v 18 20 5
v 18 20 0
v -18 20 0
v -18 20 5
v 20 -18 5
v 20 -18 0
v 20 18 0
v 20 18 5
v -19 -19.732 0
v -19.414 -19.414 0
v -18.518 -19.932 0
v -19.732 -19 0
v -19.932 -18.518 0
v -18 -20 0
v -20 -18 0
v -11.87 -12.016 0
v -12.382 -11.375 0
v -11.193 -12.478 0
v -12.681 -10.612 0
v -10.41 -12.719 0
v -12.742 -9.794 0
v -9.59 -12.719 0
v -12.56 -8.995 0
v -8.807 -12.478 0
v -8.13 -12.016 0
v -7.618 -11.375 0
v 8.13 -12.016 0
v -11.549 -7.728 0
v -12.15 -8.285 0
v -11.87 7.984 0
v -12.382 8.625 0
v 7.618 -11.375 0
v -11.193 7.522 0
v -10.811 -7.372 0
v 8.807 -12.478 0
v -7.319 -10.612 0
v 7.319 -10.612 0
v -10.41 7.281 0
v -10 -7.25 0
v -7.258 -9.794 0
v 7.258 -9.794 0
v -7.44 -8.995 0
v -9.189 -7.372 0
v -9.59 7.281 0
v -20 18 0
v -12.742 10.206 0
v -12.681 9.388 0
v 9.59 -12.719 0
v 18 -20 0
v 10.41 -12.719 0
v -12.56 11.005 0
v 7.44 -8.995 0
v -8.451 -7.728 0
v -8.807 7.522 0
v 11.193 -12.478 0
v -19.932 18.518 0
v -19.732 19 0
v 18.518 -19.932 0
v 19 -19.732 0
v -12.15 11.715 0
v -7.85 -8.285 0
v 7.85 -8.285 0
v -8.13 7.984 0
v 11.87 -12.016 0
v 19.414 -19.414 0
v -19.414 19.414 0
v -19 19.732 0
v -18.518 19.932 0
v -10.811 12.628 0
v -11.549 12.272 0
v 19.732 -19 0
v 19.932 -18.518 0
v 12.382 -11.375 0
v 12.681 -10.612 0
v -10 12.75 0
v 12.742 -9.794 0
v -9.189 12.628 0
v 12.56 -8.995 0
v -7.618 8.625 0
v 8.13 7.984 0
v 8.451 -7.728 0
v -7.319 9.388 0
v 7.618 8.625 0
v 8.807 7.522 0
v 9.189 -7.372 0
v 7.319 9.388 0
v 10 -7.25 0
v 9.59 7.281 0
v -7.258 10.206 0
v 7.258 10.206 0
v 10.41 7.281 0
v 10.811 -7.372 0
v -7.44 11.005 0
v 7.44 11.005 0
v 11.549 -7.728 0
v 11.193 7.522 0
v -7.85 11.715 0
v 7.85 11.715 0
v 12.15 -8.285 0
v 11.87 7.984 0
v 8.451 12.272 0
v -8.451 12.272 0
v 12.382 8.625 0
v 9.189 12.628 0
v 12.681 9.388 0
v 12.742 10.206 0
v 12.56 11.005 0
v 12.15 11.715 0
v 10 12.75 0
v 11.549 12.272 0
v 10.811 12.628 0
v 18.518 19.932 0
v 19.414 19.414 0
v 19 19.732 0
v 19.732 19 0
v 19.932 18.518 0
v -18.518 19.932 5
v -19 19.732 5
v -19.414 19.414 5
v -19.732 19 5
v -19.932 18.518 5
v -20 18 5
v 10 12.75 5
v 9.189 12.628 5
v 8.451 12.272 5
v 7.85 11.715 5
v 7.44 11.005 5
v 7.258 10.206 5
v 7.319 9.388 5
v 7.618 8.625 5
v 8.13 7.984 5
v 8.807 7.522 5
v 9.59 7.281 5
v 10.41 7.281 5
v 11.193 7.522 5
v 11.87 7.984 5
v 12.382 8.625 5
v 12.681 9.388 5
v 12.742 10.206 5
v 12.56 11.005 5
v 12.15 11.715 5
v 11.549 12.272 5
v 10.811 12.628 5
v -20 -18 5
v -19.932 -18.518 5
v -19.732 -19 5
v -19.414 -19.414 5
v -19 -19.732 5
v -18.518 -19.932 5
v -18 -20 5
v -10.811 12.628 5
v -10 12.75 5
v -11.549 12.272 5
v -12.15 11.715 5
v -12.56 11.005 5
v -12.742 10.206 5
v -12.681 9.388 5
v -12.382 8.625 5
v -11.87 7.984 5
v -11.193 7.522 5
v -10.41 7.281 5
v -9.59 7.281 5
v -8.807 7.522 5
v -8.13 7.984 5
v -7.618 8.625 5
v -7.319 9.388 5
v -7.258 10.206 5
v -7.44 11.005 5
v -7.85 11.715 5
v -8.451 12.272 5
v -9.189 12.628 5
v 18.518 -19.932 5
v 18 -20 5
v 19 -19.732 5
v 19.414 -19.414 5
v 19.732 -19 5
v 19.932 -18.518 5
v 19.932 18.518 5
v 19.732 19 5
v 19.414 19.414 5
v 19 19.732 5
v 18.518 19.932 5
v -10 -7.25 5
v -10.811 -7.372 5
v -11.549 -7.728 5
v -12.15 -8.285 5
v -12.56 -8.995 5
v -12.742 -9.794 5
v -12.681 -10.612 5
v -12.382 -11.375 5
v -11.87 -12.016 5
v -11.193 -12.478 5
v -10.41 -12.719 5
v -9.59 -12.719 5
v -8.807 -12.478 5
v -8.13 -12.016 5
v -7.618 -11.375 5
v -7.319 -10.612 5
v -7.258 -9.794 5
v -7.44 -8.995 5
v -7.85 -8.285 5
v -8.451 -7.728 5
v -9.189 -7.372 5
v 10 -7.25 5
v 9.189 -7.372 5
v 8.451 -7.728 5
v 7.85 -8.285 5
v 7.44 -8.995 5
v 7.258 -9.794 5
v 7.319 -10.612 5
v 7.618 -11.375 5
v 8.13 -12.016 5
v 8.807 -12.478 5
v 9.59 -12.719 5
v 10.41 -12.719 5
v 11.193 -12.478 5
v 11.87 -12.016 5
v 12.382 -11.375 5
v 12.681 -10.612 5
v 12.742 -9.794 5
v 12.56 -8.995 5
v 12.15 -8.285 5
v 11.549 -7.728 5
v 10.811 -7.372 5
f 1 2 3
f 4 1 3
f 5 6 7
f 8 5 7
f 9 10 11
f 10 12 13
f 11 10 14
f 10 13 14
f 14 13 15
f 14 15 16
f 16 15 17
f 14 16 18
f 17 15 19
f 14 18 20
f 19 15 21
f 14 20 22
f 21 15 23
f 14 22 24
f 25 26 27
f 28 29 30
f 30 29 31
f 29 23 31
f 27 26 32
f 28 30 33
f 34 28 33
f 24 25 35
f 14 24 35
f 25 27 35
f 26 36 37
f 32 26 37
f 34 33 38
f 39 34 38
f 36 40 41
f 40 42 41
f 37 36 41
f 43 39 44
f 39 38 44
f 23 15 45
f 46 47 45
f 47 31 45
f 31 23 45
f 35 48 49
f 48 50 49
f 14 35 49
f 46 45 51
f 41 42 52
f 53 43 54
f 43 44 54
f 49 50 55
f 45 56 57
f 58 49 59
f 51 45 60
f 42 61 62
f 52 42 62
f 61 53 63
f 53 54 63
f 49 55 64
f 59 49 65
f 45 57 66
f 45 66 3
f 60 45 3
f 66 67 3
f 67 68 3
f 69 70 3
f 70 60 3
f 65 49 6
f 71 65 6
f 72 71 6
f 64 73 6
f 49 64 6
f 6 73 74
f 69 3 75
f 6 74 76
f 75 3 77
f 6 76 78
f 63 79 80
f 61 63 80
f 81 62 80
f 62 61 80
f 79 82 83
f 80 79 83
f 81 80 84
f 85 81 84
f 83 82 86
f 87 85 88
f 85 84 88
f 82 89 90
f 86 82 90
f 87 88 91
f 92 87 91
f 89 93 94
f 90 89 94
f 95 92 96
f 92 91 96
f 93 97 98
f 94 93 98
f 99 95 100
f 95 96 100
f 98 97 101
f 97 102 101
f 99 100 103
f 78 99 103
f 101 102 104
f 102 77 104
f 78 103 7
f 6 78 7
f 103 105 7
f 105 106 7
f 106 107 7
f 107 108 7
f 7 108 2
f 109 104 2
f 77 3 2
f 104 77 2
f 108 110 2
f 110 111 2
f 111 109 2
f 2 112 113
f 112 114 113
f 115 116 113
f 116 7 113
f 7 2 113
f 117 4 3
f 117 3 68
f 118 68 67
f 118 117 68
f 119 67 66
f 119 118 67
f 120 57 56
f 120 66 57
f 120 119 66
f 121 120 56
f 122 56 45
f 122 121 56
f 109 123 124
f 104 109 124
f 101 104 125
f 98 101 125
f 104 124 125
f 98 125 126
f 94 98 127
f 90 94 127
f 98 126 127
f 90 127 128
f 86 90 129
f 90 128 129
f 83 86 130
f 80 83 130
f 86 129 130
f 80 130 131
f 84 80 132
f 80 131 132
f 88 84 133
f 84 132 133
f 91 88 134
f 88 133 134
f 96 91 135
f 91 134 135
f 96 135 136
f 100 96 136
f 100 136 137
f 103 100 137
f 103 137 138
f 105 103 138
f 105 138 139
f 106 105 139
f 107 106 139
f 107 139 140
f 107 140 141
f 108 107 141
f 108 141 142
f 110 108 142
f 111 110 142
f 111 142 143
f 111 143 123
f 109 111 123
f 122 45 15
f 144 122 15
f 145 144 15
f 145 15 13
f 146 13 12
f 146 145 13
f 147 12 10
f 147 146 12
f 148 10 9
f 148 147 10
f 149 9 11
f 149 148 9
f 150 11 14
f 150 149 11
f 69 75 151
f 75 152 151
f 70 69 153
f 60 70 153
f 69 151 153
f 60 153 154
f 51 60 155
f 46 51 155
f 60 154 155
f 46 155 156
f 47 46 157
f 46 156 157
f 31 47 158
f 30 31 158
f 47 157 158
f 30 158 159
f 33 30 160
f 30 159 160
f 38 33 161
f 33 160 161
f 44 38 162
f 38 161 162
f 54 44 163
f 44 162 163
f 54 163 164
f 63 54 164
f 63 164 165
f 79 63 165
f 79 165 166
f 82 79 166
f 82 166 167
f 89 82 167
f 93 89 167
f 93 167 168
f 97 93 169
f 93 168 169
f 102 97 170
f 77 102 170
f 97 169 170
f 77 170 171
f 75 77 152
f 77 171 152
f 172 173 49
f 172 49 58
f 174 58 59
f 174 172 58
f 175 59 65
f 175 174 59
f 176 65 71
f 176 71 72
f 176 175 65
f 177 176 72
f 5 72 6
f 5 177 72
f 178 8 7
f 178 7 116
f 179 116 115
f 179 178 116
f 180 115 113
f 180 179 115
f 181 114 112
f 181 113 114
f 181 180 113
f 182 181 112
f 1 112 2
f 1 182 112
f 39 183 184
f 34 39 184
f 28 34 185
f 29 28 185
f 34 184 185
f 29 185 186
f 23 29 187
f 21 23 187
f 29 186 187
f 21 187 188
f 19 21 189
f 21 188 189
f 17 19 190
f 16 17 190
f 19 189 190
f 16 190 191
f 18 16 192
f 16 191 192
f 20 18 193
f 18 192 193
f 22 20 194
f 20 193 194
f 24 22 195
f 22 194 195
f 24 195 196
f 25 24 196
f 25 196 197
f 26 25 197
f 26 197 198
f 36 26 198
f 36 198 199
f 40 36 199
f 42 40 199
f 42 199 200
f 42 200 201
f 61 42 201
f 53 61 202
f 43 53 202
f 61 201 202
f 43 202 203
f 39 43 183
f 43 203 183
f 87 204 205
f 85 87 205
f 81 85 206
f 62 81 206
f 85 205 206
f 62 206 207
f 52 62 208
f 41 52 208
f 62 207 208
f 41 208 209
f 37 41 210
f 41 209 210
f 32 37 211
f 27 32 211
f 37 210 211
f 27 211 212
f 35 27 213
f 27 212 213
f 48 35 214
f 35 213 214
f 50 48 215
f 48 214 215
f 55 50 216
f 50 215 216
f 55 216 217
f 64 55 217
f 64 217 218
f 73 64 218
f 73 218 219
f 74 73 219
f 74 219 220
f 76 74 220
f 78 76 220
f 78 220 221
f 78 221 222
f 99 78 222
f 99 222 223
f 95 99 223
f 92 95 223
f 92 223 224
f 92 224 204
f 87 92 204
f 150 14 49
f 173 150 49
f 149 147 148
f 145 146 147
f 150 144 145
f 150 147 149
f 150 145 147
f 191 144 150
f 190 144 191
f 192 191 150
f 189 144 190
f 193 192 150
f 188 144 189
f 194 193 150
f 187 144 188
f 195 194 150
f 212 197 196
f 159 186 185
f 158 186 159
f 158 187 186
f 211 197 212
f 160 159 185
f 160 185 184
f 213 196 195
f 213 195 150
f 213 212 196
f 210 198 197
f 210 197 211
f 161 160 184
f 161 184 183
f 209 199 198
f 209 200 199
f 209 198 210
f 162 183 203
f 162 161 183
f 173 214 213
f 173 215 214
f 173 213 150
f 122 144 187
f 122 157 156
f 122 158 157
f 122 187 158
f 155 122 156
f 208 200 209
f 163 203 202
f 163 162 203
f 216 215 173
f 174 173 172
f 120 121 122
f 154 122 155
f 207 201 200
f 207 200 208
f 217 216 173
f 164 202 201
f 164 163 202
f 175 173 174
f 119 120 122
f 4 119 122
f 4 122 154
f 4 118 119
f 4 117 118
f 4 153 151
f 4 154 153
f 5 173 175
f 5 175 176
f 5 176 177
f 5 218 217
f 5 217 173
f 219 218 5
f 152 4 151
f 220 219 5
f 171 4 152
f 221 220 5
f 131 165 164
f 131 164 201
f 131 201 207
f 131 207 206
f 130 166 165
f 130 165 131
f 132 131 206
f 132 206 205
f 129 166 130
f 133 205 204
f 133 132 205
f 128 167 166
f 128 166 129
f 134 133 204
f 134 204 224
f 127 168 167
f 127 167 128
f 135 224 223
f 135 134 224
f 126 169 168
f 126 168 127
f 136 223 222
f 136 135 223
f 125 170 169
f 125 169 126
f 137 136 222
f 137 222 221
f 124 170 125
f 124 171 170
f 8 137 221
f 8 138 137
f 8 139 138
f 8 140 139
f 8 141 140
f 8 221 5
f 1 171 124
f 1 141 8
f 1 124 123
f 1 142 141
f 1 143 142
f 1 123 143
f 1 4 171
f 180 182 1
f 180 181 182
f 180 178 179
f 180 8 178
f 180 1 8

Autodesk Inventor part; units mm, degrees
ref_plane "YZ Plane" through (0, 0, 0) normal (1, 0, 0) x (0, 1, 0)
ref_plane "XZ Plane" through (0, 0, 0) normal (0, 1, 0) x (-1, 0, 0)
ref_plane "XY Plane" through (0, 0, 0) normal (0, 0, 1) x (1, 0, 0)
sketch "Sketch2" plane through (0, 0, 0) normal (0, 0, 1) x (1, 0, 0)
  line L0 (-20, -20) -> (20, -20)
  line L1 (20, -20) -> (20, 20)
  line L2 (20, 20) -> (-20, 20)
  line L3 (-20, 20) -> (-20, -20)
  line L4 (-20, -20) -> (20, 20) construction
  line L5 (20, -20) -> (-20, 20) construction
  line L6 (-10, -10) -> (10, -10) construction
  line L7 (10, -10) -> (10, 10) construction
  line L8 (10, 10) -> (-10, 10) construction
  line L9 (-10, 10) -> (-10, -10) construction
  line L10 (-10, -10) -> (10, 10) construction
  line L11 (10, -10) -> (-10, 10) construction
  point P0 (0, 0)
  dimension "d0" = 40
  dimension "d1" = 40
  dimension "d2" = 20
  dimension "d3" = 20
extrude "Extrusion1" add sketch "Sketch2" along normal blind 5
hole "Hole1" at (-10, 10, 0) at (10, 10, 0) at (10, -10, 0) at (-10, -10, 0) direction (0, 0, 1) diameter 5.5 end through all clearance for "Flat Head Machine Screw" size "M5" standard "Ansi Metric M Profile"
fillet "Fillet1" radius 2 4 edges at (20, 20, 2.5) (-20, 20, 2.5) (-20, -20, 2.5) (20, -20, 2.5)
properties part number "4040Square"
